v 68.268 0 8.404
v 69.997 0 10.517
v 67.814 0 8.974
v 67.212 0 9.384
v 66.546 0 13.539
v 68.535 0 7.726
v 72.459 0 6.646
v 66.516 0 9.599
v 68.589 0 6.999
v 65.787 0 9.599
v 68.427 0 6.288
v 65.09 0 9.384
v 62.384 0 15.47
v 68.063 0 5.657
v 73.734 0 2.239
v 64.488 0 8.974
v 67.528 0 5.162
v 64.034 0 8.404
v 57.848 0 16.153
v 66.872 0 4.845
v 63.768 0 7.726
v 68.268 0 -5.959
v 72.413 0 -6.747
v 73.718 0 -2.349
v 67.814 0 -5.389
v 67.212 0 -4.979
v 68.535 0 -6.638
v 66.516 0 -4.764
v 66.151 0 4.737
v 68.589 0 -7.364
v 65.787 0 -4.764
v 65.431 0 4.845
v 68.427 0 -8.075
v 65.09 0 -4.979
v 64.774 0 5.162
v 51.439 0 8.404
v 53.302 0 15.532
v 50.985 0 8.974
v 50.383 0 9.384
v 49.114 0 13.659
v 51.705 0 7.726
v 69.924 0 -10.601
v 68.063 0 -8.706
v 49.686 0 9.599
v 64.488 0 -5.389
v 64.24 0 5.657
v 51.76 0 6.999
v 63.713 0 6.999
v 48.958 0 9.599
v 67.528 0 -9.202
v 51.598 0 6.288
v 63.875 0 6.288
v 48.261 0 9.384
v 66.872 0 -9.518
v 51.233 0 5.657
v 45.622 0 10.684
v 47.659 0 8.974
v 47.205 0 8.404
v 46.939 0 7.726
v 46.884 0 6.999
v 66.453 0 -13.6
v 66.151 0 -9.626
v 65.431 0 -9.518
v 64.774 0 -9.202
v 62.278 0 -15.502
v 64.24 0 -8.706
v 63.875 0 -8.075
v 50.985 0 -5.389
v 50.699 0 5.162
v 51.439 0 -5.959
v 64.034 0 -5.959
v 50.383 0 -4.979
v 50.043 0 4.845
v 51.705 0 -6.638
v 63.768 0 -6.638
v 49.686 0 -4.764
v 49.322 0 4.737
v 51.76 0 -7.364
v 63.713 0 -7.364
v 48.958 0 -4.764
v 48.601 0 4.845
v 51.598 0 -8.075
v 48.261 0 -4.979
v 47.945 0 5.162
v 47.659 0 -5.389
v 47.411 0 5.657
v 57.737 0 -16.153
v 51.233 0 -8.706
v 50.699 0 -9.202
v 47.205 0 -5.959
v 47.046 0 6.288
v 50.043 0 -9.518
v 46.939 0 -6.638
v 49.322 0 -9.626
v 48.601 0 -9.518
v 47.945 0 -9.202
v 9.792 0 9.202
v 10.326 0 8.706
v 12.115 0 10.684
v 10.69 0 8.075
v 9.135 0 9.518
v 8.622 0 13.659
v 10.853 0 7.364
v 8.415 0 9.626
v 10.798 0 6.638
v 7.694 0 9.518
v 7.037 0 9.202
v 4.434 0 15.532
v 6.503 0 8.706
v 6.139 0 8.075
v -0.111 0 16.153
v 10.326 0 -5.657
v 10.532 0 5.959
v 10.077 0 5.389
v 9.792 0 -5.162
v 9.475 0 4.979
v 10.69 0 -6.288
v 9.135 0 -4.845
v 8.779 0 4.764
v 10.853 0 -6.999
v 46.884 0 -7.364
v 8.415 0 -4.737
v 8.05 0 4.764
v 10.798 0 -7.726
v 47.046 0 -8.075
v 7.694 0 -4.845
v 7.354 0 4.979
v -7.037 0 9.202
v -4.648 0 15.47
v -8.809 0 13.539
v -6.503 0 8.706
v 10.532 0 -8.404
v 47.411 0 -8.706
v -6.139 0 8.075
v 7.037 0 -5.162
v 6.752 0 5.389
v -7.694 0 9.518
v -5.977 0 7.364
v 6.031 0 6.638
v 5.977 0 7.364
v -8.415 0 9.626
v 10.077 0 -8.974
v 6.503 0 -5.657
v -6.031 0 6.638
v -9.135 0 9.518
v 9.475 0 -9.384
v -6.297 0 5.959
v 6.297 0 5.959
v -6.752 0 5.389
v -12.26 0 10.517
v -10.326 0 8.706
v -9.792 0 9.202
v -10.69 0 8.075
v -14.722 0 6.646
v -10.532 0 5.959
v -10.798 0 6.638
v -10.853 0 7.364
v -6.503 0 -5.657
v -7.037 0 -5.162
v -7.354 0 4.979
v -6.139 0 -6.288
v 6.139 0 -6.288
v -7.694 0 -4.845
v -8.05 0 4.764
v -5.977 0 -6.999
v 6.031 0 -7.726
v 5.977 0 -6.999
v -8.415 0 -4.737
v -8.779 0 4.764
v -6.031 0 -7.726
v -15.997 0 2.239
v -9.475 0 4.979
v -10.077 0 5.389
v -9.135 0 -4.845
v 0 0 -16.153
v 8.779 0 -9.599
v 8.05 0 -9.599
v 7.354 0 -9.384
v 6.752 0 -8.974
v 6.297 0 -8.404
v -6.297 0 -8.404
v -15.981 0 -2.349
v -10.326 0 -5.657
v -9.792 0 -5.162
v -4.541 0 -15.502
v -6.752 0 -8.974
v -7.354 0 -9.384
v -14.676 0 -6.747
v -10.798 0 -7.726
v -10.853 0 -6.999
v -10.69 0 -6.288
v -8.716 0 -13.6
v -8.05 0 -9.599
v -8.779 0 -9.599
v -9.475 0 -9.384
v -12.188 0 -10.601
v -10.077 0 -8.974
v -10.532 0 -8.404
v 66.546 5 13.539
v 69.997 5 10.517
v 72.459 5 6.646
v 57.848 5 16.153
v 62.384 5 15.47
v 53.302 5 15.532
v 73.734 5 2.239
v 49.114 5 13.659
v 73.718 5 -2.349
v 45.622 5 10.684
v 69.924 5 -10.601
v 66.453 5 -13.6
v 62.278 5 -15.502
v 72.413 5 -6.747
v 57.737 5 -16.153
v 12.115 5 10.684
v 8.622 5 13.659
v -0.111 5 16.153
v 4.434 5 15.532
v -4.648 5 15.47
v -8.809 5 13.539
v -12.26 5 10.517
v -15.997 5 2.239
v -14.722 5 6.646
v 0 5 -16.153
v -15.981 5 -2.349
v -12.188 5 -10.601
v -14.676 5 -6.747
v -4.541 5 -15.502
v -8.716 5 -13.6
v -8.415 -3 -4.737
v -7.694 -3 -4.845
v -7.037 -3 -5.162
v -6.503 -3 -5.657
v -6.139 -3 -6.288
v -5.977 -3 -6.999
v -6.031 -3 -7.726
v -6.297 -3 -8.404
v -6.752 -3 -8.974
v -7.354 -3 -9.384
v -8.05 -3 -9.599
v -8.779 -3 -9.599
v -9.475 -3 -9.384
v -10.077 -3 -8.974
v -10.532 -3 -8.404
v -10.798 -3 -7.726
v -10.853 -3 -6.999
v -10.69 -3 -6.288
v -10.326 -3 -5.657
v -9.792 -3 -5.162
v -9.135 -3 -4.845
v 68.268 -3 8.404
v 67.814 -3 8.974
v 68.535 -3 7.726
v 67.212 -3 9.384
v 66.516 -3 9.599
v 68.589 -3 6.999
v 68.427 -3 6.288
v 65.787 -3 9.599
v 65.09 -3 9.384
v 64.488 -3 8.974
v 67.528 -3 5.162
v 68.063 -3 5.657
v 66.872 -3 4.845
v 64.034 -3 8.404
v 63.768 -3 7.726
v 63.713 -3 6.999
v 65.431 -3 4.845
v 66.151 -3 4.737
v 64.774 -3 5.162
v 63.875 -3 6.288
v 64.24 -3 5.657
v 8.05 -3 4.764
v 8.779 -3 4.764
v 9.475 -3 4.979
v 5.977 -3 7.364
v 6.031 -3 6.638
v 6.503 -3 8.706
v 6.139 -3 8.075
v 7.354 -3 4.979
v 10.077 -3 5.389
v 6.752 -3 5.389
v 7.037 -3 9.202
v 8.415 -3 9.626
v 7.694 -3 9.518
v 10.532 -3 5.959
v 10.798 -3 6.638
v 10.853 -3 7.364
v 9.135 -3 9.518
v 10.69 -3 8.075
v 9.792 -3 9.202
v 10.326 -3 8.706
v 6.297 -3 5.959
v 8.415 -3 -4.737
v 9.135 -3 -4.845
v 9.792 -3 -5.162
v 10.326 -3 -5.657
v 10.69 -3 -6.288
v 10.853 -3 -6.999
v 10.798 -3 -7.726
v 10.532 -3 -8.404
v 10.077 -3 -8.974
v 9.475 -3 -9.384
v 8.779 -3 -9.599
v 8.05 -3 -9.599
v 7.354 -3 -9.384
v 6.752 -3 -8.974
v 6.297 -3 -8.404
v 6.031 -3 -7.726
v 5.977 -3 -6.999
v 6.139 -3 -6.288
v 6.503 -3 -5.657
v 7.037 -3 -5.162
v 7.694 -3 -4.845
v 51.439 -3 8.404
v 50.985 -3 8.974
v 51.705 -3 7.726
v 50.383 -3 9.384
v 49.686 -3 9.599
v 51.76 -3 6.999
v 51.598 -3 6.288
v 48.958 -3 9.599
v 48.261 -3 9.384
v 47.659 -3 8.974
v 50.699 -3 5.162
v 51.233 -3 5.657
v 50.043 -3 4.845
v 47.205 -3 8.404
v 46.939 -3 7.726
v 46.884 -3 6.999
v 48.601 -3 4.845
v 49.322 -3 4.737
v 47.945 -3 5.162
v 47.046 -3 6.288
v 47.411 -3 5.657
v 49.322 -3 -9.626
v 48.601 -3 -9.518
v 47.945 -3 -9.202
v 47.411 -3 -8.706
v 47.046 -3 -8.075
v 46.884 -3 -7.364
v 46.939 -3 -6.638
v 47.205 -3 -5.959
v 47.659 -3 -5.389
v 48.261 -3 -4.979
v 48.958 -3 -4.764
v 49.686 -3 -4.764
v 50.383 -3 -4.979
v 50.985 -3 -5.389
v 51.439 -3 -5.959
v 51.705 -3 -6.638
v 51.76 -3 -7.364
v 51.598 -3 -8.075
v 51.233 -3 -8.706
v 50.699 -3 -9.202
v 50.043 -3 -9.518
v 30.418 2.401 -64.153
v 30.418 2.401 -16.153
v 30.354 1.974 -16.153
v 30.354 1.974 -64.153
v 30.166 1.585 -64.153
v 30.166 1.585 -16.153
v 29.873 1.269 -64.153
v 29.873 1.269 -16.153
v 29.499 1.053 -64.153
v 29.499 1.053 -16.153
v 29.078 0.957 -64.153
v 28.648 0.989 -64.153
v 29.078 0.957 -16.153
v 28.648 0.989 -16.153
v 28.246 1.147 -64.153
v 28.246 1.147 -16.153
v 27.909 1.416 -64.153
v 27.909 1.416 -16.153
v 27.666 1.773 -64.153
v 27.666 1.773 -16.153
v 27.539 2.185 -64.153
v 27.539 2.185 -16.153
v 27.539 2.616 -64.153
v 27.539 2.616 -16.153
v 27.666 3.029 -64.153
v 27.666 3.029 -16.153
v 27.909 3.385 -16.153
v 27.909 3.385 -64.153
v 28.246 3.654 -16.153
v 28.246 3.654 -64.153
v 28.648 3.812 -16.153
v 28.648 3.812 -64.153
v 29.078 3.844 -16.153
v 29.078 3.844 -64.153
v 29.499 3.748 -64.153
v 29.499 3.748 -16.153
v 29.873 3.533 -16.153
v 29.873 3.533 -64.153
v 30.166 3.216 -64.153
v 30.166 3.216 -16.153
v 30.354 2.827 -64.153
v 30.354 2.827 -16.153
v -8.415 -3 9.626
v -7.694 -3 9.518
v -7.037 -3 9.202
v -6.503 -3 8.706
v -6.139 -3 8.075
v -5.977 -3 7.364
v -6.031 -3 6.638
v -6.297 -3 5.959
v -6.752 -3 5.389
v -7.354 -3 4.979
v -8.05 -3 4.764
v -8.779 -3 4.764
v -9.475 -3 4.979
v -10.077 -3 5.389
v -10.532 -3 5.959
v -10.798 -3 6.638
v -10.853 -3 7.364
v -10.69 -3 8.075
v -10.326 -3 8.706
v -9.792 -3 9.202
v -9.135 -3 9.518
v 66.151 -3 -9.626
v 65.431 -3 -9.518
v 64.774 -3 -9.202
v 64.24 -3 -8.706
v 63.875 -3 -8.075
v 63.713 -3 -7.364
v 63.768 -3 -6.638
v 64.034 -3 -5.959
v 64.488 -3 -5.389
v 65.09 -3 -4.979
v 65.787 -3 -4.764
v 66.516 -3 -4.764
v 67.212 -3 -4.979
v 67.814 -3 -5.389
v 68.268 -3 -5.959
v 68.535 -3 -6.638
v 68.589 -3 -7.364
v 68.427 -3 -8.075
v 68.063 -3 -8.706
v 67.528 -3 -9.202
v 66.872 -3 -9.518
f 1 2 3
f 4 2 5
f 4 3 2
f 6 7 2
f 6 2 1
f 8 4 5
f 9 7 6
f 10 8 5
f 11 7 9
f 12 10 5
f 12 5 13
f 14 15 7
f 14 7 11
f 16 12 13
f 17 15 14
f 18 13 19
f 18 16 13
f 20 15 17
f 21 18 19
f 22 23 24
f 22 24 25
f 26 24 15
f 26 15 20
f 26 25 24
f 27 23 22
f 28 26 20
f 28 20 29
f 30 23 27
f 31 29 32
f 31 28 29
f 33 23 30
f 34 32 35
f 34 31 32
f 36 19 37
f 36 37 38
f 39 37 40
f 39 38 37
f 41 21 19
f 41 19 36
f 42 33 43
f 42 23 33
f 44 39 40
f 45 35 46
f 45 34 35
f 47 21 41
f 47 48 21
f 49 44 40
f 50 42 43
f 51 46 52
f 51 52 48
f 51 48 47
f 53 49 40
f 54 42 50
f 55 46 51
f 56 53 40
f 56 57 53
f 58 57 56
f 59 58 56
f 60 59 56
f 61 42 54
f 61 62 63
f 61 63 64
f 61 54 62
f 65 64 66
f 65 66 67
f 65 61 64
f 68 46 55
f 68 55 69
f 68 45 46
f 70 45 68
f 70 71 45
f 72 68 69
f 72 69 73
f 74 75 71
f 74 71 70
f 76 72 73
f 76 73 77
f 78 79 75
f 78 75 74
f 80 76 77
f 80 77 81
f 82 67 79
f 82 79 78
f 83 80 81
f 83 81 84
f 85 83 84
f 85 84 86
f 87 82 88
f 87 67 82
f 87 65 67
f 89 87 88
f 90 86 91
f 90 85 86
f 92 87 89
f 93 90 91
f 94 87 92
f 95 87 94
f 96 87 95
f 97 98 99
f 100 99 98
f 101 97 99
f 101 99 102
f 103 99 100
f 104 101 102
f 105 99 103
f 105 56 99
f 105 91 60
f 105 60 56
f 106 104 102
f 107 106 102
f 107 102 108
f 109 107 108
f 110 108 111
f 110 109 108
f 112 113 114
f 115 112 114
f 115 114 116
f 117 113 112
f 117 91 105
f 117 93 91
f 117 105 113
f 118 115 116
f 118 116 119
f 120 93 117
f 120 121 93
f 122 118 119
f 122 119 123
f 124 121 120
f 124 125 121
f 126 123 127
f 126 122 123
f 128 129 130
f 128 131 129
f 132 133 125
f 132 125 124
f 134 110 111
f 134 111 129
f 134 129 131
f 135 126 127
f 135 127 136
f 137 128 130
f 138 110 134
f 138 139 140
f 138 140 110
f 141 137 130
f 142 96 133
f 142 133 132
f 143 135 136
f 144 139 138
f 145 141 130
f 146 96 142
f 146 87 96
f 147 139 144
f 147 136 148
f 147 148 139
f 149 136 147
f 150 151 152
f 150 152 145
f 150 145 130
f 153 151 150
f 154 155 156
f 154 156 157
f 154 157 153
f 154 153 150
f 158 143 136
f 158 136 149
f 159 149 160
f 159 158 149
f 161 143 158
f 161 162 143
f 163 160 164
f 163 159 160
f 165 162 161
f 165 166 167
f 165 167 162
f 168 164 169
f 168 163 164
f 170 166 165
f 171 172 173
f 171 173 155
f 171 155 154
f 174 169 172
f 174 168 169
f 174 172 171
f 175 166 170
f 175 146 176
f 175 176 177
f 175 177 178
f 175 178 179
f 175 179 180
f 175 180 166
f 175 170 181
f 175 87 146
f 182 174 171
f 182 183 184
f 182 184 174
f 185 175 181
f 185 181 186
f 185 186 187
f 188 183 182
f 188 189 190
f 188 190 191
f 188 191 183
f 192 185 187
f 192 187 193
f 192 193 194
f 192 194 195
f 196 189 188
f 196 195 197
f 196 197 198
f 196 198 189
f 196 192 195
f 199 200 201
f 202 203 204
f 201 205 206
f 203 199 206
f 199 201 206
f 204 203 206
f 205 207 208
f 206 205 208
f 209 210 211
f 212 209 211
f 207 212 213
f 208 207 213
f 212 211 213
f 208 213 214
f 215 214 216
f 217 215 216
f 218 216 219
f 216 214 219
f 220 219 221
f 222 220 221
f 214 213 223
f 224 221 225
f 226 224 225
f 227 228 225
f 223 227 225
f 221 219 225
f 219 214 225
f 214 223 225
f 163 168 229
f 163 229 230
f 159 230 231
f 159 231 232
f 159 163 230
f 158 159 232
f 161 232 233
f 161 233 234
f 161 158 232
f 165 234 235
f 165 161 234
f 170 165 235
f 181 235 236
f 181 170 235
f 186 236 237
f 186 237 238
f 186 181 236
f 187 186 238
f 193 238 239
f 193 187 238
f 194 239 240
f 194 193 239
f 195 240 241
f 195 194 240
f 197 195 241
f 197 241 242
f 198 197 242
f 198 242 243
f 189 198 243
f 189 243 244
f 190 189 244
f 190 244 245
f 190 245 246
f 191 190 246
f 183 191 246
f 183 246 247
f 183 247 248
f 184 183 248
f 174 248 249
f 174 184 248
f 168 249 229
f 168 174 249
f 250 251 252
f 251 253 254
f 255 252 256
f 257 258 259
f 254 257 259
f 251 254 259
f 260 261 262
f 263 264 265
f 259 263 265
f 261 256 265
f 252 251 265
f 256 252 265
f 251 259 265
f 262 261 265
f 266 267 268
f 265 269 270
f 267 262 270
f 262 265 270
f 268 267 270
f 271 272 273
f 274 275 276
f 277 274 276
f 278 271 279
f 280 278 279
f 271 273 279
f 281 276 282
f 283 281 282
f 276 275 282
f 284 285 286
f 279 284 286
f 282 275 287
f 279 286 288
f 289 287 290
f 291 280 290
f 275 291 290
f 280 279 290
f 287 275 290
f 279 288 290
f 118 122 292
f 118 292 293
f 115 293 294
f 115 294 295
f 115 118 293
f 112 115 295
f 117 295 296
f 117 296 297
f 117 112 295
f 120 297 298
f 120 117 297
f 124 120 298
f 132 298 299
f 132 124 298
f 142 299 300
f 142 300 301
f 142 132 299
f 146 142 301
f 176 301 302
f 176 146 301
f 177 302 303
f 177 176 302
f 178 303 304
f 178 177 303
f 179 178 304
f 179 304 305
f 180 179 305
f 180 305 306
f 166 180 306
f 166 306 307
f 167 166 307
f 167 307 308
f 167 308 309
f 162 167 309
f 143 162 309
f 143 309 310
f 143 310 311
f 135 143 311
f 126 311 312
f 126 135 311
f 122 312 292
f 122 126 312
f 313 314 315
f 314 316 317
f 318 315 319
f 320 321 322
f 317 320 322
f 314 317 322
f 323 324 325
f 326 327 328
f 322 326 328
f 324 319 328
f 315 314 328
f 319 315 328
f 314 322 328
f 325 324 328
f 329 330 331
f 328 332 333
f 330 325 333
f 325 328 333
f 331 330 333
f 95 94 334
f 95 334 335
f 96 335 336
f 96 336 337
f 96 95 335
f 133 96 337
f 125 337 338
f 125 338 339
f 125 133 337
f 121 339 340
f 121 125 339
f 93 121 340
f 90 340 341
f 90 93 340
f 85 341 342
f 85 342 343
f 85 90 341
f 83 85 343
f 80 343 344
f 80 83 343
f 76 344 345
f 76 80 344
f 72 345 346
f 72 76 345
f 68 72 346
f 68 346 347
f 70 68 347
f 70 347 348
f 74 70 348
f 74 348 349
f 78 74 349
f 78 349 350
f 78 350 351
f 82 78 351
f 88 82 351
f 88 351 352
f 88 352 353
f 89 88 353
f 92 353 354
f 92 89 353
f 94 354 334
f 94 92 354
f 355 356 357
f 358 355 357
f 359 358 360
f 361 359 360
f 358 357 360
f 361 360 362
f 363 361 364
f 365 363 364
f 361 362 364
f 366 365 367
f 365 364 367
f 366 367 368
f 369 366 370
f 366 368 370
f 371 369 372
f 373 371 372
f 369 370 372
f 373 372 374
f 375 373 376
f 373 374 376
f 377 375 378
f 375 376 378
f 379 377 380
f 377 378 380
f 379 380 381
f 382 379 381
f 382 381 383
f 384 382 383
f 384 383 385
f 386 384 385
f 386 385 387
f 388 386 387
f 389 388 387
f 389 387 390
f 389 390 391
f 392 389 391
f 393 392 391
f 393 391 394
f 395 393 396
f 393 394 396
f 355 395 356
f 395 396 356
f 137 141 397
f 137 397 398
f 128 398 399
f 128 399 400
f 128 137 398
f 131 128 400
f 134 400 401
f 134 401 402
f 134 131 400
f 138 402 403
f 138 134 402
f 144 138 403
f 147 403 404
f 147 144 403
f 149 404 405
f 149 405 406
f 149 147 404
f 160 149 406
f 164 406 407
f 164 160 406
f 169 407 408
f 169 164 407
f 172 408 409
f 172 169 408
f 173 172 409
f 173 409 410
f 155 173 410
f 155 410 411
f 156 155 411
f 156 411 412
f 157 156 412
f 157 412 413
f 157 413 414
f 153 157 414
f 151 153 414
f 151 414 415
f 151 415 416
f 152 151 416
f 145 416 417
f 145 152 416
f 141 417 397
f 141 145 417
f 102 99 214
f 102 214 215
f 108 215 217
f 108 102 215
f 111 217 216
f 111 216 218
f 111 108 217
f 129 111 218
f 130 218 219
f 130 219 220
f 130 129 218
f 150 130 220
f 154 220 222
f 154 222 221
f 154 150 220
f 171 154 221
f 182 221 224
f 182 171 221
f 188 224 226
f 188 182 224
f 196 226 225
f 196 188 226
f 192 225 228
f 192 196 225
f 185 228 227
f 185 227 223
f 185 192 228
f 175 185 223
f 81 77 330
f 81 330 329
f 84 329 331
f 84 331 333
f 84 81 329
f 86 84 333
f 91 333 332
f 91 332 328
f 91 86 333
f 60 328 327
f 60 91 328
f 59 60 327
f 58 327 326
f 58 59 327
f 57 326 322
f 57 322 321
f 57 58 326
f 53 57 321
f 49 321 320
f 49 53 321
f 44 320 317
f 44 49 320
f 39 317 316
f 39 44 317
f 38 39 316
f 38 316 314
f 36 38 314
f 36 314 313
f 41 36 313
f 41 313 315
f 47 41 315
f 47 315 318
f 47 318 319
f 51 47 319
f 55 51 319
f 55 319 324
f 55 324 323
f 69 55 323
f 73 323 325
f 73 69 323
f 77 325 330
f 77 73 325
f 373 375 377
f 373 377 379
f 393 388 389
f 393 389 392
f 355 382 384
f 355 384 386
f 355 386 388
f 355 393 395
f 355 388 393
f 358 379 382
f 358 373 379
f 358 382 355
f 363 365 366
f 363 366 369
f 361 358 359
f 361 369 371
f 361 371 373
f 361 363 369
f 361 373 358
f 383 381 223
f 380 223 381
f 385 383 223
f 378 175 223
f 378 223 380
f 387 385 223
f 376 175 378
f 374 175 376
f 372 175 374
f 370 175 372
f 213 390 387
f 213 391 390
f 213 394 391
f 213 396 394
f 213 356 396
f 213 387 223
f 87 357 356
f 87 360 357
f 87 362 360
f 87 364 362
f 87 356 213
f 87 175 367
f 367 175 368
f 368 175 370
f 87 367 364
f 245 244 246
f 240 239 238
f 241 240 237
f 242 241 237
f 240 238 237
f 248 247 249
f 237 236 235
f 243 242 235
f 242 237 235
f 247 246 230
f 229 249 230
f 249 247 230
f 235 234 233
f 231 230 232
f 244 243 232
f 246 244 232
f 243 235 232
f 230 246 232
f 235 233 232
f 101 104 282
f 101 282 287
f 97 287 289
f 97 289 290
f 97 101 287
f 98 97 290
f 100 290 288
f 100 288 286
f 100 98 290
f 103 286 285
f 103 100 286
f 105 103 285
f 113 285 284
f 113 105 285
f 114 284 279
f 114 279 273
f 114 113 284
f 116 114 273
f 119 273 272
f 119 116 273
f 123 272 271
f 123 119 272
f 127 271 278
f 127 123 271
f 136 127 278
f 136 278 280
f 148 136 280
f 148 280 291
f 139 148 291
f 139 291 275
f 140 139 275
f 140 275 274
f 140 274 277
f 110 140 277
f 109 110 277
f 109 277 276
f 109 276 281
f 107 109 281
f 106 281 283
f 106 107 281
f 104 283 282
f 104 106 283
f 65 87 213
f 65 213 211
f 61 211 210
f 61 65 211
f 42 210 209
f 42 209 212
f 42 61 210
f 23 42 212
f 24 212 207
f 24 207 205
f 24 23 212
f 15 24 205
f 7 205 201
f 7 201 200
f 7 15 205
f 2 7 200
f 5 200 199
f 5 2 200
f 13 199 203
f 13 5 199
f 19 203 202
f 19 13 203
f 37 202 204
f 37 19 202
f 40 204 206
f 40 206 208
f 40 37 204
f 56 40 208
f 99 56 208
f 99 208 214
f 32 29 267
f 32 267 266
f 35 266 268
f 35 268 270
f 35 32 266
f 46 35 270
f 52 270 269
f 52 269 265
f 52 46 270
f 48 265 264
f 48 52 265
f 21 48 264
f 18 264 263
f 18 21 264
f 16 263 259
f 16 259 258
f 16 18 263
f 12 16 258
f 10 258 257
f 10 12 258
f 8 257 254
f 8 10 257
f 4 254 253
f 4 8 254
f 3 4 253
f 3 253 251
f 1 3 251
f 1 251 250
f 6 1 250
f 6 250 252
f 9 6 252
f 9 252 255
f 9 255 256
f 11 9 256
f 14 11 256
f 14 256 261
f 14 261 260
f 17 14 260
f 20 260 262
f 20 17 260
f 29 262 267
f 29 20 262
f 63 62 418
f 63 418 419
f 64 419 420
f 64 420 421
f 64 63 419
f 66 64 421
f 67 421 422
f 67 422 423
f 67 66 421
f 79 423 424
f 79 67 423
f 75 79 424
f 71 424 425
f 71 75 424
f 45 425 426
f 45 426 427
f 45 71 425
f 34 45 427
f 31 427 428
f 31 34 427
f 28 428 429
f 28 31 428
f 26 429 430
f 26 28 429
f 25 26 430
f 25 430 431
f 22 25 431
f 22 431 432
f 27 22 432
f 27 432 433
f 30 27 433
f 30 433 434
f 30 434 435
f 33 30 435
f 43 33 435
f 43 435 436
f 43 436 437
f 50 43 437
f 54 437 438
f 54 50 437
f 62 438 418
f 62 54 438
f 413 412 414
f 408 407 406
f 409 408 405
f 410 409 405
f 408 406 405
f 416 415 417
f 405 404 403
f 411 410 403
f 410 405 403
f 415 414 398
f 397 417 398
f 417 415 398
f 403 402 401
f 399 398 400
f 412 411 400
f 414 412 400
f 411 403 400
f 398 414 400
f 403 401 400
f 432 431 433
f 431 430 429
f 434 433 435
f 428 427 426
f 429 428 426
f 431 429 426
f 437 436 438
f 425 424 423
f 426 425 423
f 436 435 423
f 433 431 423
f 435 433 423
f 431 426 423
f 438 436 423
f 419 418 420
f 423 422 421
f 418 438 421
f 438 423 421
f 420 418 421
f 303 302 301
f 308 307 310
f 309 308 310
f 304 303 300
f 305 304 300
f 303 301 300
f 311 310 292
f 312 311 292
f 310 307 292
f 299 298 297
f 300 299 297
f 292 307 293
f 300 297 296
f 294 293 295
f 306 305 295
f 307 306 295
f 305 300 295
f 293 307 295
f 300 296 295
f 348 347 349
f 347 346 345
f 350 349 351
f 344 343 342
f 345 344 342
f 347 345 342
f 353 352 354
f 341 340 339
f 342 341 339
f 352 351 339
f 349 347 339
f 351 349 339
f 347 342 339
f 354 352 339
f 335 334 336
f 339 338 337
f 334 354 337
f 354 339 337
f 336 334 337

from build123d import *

# Parameters (mm, degrees)
BOSS_EXTRUDE1_DEPTH = 5
SKETCH2_R           = 2.444777137
BOSS_EXTRUDE2_DEPTH = 3
SKETCH4_R           = 1.447783819
BOSS_EXTRUDE3_DEPTH = 48


with BuildPart() as part:
    # Sketch1 → Boss-Extrude1 (new body)
    with BuildSketch(Plane(origin=(0, 0, 0), x_dir=(1, 0, 0), z_dir=(0, 1, 0))):
        with BuildLine():
            Line((0, 16.15299729), (57.736574248, 16.15299729))
            ThreePointArc((57.736574248, 16.15299729), (72.459068519, -6.645862163), (45.621959745, -10.684354773))
            Line((45.621959745, -10.684354773), (12.114614503, -10.684354773))
            ThreePointArc((12.114614503, -10.684354773), (-14.722494271, -6.645862163), (0, 16.15299729))
        make_face()
    extrude(amount=BOSS_EXTRUDE1_DEPTH)

    # Sketch2 → Boss-Extrude2 (add)
    with BuildSketch(Plane(origin=(0, 0, 0), x_dir=(1, 0, 0), z_dir=(0, 1, 0))):
        with Locations(Location((-8.414564217, 7.18153284, 0), (0, 0, 270))):
            Circle(SKETCH2_R)
        with Locations(Location((-8.414564217, -7.18153284, 0), (0, 0, 270))):
            Circle(SKETCH2_R)
        with Locations(Location((8.414564217, 7.18153284, 0), (0, 0, 270))):
            Circle(SKETCH2_R)
        with Locations(Location((8.414564217, -7.18153284, 0), (0, 0, 270))):
            Circle(SKETCH2_R)
        with Locations(Location((66.151138464, 7.18153284, 0), (0, 0, 90))):
            Circle(SKETCH2_R)
        with Locations(Location((66.151138464, -7.18153284, 0), (0, 0, 90))):
            Circle(SKETCH2_R)
        with Locations(Location((49.322010031, -7.18153284, 0), (0, 0, 90))):
            Circle(SKETCH2_R)
        with Locations(Location((49.322010031, 7.18153284, 0), (0, 0, 90))):
            Circle(SKETCH2_R)
    extrude(amount=-BOSS_EXTRUDE2_DEPTH)

    # Sketch4 → Boss-Extrude3 (add)
    with BuildSketch(Plane(origin=(0, 0, -16.15299729), x_dir=(-1, 0, 0), z_dir=(0, 0, -1))):
        with Locations(Location((-28.970152838, 2.400681273, 0), (0, 0, 180))):
            Circle(SKETCH4_R)
    extrude(amount=BOSS_EXTRUDE3_DEPTH)


solid = part.part
